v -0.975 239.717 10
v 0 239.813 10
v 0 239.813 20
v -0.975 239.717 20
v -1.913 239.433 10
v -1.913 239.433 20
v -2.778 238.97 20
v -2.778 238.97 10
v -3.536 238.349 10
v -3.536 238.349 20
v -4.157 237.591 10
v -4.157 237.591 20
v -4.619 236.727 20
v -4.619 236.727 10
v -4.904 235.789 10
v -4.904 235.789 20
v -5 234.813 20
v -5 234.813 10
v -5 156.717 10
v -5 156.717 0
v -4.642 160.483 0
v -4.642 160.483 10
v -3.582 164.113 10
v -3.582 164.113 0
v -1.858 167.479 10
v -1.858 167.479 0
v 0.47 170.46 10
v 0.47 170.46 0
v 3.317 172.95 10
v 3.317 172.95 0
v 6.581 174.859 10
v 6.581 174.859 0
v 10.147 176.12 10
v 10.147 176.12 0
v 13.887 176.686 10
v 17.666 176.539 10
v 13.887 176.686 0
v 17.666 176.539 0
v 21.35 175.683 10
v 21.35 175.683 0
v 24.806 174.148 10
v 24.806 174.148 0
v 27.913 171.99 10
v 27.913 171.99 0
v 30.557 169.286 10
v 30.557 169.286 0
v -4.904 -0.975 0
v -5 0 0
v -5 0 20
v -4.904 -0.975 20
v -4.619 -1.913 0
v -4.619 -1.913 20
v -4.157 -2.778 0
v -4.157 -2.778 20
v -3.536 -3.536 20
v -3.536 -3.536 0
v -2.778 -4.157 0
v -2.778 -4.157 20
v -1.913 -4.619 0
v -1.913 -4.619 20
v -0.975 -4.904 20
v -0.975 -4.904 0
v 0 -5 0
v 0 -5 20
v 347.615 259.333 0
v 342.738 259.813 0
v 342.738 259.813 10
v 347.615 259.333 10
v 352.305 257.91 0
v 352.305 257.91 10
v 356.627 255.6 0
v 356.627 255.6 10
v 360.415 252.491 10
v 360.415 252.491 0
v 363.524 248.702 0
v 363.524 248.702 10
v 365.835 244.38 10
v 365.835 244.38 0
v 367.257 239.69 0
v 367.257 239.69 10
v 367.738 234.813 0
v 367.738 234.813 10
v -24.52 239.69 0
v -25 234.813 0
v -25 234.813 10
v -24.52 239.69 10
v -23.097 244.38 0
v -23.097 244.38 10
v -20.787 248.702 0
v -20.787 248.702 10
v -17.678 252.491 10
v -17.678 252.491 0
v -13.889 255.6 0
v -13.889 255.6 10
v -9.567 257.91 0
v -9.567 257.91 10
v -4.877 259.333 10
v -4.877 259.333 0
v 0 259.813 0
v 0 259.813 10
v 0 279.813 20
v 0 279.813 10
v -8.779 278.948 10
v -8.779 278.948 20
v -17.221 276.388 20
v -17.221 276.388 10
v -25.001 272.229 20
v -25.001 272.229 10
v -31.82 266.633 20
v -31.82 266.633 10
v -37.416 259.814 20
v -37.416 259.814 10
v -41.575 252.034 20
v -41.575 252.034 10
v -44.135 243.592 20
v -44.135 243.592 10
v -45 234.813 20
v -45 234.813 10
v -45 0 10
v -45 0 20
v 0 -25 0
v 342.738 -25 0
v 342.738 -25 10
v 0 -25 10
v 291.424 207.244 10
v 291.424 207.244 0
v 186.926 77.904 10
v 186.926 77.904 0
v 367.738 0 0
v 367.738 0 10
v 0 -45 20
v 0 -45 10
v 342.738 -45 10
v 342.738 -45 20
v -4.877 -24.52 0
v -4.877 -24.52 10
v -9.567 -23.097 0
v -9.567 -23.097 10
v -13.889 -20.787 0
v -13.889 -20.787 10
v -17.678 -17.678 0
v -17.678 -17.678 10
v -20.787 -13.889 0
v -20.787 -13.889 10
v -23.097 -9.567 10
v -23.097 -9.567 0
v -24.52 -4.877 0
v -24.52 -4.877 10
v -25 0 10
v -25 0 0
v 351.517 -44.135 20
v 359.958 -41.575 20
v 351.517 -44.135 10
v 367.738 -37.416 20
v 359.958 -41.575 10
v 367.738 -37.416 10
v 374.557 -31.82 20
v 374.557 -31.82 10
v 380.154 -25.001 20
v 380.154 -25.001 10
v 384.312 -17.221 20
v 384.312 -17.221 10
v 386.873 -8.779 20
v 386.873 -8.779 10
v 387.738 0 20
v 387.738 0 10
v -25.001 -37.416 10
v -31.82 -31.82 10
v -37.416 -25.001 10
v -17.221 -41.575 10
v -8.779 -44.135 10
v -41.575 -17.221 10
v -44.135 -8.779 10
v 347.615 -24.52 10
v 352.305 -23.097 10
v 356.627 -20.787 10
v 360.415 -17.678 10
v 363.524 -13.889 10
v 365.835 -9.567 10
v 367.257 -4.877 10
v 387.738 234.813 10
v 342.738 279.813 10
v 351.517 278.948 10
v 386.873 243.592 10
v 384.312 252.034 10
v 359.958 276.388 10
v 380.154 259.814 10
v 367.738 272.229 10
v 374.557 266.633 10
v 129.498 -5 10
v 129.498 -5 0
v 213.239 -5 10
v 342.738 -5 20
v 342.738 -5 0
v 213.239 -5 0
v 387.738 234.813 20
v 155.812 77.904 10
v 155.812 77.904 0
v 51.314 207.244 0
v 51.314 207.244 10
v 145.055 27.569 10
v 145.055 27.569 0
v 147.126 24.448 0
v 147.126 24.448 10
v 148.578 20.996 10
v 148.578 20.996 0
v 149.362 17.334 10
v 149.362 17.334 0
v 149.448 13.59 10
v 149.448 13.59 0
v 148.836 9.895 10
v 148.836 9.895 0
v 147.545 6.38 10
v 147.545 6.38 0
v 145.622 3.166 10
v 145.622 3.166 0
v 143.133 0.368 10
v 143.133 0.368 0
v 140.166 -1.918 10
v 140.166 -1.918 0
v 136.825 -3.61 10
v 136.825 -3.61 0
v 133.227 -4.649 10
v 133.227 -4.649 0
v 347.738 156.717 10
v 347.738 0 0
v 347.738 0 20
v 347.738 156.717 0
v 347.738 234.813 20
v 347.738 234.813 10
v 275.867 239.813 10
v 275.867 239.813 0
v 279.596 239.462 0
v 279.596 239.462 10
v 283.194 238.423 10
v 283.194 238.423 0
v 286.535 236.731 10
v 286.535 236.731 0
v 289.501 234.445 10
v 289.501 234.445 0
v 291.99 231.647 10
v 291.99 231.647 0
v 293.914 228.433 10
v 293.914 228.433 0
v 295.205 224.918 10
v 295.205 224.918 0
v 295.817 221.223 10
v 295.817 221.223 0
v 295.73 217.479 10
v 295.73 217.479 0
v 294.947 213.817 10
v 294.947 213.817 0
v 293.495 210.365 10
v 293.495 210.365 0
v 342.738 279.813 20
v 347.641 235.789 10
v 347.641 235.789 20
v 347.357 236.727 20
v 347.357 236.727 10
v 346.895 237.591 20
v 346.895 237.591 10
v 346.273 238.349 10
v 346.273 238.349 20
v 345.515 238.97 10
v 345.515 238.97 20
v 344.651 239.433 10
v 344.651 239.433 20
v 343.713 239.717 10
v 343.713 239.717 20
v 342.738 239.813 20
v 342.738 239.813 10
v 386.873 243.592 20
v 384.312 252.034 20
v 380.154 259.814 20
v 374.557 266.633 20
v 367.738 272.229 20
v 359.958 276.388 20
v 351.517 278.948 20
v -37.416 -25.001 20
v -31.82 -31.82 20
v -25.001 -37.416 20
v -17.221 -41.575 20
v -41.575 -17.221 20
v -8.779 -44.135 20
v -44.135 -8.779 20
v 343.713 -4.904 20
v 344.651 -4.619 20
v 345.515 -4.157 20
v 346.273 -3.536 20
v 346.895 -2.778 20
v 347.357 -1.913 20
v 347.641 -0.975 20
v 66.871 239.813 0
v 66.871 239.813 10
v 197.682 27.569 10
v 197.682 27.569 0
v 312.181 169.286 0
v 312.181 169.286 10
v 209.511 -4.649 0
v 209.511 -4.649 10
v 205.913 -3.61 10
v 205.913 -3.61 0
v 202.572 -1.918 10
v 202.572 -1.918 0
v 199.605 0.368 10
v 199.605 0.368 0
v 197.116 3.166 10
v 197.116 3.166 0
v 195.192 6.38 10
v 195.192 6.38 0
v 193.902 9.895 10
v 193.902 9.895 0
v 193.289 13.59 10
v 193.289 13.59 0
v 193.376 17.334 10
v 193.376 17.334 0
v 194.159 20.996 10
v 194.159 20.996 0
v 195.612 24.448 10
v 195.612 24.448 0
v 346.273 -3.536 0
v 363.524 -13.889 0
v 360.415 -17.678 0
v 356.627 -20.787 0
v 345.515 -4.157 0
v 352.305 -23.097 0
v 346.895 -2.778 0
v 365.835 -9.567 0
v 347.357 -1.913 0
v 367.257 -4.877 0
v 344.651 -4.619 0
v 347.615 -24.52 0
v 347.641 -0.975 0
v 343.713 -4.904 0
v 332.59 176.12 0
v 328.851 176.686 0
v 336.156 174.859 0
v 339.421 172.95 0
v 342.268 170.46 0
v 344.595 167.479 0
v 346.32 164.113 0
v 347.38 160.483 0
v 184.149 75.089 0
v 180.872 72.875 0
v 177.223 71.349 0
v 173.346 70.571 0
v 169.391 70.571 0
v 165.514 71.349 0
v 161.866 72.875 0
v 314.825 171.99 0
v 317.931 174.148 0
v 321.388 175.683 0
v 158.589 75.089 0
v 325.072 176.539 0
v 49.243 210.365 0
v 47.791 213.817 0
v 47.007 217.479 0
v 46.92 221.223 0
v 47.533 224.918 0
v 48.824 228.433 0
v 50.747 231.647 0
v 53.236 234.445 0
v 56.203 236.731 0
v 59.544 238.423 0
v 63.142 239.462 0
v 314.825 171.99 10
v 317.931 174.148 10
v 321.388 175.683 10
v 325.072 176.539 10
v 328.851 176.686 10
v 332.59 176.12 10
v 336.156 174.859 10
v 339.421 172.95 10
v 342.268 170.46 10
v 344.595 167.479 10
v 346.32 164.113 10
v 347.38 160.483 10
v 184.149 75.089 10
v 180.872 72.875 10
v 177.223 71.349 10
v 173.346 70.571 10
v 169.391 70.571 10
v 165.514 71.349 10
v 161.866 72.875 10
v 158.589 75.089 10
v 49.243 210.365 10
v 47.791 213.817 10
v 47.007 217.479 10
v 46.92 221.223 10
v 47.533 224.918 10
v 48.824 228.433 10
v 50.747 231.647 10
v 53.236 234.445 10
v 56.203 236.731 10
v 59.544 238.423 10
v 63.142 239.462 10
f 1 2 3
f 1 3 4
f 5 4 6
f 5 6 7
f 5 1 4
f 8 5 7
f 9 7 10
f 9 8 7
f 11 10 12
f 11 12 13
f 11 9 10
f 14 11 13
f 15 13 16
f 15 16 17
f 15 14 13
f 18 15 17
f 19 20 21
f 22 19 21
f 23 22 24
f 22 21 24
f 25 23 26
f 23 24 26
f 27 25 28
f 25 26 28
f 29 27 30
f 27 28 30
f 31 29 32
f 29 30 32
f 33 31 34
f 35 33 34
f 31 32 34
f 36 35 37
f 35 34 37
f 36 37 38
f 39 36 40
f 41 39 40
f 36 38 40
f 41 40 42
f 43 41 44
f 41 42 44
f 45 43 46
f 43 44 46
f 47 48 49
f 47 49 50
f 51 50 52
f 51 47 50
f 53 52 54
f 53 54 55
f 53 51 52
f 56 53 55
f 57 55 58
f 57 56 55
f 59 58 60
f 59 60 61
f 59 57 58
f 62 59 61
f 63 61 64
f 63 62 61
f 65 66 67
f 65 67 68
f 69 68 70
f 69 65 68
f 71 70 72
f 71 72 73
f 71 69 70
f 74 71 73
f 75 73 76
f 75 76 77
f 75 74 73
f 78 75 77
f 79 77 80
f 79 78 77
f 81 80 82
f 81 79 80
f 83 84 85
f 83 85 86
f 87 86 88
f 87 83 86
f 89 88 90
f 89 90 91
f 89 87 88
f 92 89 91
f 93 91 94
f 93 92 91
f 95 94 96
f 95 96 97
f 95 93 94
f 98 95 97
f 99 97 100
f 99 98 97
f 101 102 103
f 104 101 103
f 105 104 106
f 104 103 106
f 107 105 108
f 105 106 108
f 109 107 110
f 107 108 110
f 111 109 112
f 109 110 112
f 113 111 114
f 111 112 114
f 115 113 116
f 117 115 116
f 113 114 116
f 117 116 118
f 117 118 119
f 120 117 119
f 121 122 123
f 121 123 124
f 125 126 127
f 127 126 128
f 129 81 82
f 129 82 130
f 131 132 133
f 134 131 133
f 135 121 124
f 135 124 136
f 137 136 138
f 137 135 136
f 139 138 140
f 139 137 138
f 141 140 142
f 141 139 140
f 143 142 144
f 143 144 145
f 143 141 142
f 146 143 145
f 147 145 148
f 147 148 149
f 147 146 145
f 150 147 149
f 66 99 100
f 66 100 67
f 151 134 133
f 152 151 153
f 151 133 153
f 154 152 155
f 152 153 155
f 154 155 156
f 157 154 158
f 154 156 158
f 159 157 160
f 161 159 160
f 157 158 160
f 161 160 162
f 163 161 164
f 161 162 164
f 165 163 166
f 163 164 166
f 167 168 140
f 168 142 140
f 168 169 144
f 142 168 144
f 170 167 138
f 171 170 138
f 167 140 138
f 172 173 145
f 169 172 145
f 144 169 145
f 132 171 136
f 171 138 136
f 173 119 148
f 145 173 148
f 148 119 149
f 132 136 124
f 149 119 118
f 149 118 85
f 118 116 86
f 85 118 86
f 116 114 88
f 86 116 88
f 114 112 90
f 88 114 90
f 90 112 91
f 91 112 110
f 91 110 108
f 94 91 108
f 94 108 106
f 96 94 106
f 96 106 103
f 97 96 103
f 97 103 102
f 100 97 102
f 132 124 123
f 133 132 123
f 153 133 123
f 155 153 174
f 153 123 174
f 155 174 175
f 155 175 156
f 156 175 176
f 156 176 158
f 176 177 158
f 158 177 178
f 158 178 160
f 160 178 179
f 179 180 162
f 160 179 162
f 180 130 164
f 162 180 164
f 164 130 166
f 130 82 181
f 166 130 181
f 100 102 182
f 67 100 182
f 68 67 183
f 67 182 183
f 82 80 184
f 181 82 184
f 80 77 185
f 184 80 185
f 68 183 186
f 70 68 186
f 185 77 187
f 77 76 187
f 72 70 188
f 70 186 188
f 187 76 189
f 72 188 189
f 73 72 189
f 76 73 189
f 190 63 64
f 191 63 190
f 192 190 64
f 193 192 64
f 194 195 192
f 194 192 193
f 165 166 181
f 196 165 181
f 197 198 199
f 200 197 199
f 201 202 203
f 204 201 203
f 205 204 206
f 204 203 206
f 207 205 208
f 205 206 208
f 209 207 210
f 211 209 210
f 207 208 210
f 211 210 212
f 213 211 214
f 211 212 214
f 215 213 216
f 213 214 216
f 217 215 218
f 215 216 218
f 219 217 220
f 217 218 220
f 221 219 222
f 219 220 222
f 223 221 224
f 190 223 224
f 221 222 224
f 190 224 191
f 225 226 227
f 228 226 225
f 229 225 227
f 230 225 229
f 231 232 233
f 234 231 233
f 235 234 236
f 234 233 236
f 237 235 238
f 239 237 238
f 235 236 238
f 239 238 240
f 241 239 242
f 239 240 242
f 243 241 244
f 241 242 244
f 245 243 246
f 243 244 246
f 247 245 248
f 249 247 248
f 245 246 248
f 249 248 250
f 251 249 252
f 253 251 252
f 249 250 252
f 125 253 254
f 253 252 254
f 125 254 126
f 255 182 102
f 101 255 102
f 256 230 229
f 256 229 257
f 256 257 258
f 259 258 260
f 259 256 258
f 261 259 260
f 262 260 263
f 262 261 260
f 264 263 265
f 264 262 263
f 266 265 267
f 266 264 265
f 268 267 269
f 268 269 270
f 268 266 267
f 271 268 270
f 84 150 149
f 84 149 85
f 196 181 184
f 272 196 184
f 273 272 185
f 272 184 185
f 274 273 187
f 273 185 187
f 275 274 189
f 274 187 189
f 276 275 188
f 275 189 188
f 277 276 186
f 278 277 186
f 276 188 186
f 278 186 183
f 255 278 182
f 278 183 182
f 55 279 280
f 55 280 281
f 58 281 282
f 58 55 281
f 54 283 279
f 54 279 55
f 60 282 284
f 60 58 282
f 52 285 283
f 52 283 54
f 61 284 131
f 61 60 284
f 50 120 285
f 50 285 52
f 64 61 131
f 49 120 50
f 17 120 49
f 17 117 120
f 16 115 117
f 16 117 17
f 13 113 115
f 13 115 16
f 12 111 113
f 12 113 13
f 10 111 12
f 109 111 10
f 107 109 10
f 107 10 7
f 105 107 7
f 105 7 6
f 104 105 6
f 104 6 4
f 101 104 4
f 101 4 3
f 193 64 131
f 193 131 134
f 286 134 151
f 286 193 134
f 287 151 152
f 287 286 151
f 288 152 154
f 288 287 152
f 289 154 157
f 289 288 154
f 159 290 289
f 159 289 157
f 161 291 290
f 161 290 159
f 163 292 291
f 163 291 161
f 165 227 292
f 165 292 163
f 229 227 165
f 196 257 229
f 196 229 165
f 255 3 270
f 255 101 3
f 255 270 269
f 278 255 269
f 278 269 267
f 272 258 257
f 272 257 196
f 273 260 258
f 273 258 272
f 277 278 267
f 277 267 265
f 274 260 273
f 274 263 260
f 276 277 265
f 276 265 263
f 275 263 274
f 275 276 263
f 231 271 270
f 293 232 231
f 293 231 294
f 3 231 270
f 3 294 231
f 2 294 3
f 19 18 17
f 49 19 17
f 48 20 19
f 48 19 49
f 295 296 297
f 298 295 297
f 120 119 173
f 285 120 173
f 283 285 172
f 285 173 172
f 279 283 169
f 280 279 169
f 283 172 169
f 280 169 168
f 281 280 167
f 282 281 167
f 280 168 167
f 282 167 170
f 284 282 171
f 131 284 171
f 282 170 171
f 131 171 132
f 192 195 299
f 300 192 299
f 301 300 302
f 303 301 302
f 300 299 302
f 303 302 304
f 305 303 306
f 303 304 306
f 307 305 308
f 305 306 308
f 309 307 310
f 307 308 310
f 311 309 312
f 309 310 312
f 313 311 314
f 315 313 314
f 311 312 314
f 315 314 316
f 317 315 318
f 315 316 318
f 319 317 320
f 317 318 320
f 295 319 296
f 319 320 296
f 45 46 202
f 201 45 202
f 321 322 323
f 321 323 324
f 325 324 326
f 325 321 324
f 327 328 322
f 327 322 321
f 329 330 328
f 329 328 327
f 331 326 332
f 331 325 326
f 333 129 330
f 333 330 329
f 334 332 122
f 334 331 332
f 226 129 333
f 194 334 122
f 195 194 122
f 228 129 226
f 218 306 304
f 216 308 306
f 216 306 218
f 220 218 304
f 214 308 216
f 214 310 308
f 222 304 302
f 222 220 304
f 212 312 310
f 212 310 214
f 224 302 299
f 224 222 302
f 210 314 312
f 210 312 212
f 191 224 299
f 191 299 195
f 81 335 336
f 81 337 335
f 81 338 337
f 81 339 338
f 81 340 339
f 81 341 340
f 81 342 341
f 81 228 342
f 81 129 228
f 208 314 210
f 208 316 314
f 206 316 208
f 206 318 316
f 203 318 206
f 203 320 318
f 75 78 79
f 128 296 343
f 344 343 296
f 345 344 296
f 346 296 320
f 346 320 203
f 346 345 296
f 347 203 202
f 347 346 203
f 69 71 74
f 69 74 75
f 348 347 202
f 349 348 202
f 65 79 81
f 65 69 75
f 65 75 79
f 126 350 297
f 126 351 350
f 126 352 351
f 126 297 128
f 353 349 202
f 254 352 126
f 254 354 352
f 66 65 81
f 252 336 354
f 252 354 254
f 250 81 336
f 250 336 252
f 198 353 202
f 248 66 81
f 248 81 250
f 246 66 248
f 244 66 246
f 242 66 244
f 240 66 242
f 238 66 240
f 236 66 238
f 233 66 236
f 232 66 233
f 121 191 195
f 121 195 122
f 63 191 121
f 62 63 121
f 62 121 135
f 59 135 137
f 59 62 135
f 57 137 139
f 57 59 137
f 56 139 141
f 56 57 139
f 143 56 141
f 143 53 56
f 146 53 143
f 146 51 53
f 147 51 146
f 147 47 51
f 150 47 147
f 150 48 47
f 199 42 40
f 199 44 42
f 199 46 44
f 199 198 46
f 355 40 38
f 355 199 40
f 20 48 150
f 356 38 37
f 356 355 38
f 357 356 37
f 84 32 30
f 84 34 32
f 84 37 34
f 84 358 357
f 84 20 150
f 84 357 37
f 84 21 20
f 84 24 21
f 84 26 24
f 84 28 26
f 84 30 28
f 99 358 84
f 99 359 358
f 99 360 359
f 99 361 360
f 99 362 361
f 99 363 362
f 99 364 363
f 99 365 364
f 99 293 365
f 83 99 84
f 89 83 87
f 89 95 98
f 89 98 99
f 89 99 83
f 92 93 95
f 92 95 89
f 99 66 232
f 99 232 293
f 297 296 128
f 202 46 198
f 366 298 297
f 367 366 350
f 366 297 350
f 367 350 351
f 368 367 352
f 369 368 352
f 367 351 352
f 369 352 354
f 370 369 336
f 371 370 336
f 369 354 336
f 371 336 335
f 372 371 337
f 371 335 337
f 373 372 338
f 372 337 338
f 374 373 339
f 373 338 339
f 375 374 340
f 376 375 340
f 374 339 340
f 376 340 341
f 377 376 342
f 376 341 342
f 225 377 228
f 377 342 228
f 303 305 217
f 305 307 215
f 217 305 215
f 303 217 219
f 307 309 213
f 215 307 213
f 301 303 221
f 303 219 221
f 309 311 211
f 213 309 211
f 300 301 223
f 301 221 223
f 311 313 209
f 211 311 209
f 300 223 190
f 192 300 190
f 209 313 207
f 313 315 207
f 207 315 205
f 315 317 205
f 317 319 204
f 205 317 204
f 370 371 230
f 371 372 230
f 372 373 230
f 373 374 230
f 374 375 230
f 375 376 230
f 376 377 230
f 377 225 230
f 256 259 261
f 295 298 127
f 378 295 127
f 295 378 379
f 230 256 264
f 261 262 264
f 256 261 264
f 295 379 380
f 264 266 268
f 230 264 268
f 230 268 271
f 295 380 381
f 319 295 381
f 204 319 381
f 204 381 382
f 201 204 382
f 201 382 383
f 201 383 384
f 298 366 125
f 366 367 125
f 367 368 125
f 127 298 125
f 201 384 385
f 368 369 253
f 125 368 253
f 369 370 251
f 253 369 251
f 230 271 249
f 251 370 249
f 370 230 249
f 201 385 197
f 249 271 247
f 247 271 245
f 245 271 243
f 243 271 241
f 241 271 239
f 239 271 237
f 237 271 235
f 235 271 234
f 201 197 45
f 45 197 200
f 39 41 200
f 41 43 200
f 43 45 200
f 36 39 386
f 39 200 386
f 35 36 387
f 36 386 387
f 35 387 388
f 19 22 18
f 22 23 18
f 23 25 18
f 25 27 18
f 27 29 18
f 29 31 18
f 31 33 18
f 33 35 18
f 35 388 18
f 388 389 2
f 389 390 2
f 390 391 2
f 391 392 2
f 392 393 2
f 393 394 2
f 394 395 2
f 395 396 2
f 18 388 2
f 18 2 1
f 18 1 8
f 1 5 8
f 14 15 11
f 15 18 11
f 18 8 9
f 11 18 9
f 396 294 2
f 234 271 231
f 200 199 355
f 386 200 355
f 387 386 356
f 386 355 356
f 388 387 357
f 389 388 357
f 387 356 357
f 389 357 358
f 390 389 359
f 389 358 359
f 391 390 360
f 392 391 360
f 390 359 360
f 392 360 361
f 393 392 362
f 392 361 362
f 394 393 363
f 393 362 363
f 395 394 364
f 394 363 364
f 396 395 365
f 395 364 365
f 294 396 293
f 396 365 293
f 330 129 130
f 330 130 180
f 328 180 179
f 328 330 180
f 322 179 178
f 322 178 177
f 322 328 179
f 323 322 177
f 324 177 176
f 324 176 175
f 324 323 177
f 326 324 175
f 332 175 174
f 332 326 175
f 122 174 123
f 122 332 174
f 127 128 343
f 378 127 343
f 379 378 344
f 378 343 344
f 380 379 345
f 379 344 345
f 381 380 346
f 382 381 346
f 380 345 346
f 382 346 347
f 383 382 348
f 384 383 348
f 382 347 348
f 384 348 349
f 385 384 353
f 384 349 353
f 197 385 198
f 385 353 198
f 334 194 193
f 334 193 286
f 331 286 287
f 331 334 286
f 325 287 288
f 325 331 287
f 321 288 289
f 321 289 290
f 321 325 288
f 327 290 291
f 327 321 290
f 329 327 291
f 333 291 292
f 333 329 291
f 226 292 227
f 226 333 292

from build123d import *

# Parameters (mm, degrees)
BOSS_EXTRUDE1_DEPTH = 10
BOSS_EXTRUDE2_DEPTH = 10


with BuildPart() as part:
    # Sketch1 → Boss-Extrude1 (new body)
    with BuildSketch(Plane.XY):
        with BuildLine():
            Line((-25, 0), (-25, 234.81313371))
            ThreePointArc((-25, 234.81313371), (-17.67766953, 252.49080324), (0, 259.81313371))
            Line((0, 259.81313371), (342.73755676, 259.81313371))
            ThreePointArc((342.73755676, 259.81313371), (360.415226289, 252.49080324), (367.73755676, 234.81313371))
            Line((367.73755676, 234.81313371), (367.73755676, 0))
            ThreePointArc((367.73755676, 0), (360.415226289, -17.67766953), (342.73755676, -25))
            Line((342.73755676, -25), (0, -25))
            ThreePointArc((0, -25), (-17.67766953, -17.67766953), (-25, 0))
        make_face()
        with BuildLine():
            Line((-5, 0), (-5, 156.717467164))
            ThreePointArc((-5, 156.717467164), (8.334411906, 175.574029293), (30.556993535, 169.286474767))
            Line((30.556993535, 169.286474767), (145.055204149, 27.569007604))
            ThreePointArc((145.055204149, 27.569007604), (147.545096107, 6.37967959), (129.498210613, -5))
            Line((129.498210613, -5), (0, -5))
            ThreePointArc((0, -5), (-3.535533906, -3.535533906), (-5, 0))
        make_face(mode=Mode.SUBTRACT)
        with BuildLine():
            Line((66.870567767, 239.81313371), (275.866988993, 239.81313371))
            ThreePointArc((275.866988993, 239.81313371), (293.913874487, 228.43345412), (291.423982529, 207.244126107))
            Line((291.423982529, 207.244126107), (186.925771915, 77.903923741))
            ThreePointArc((186.925771915, 77.903923741), (171.36877838, 70.472931344), (155.811784844, 77.903923741))
            Line((155.811784844, 77.903923741), (51.313574231, 207.244126107))
            ThreePointArc((51.313574231, 207.244126107), (48.823682273, 228.43345412), (66.870567767, 239.81313371))
        make_face(mode=Mode.SUBTRACT)
        with BuildLine():
            Line((347.73755676, 156.717467164), (347.73755676, 0))
            ThreePointArc((347.73755676, 0), (346.273090666, -3.535533906), (342.73755676, -5))
            Line((342.73755676, -5), (213.239346146, -5))
            ThreePointArc((213.239346146, -5), (195.192460652, 6.37967959), (197.682352611, 27.569007604))
            Line((197.682352611, 27.569007604), (312.180563224, 169.286474767))
            ThreePointArc((312.180563224, 169.286474767), (334.403144854, 175.574029293), (347.73755676, 156.717467164))
        make_face(mode=Mode.SUBTRACT)
    extrude(amount=BOSS_EXTRUDE1_DEPTH)

    # Sketch2 → Boss-Extrude2 (add)
    with BuildSketch(Plane.XY.offset(10)):
        with BuildLine():
            Line((342.73755676, 279.81313371), (0, 279.81313371))
            ThreePointArc((0, 279.81313371), (-31.819805153, 266.632938864), (-45, 234.81313371))
            Line((-45, 234.81313371), (-45, 0))
            ThreePointArc((-45, 0), (-31.819805153, -31.819805153), (0, -45))
            Line((0, -45), (342.73755676, -45))
            ThreePointArc((342.73755676, -45), (374.557361913, -31.819805153), (387.73755676, 0))
            Line((387.73755676, 0), (387.73755676, 234.81313371))
            ThreePointArc((387.73755676, 234.81313371), (374.557361913, 266.632938864), (342.73755676, 279.81313371))
        make_face()
        with BuildLine():
            Line((342.73755676, 239.81313371), (0, 239.81313371))
            ThreePointArc((0, 239.81313371), (-3.535533906, 238.348667616), (-5, 234.81313371))
            Line((-5, 234.81313371), (-5, 0))
            ThreePointArc((-5, 0), (-3.535533906, -3.535533906), (0, -5))
            Line((0, -5), (342.73755676, -5))
            ThreePointArc((342.73755676, -5), (346.273090666, -3.535533906), (347.73755676, 0))
            Line((347.73755676, 0), (347.73755676, 234.81313371))
            ThreePointArc((347.73755676, 234.81313371), (346.273090666, 238.348667616), (342.73755676, 239.81313371))
        make_face(mode=Mode.SUBTRACT)
    extrude(amount=BOSS_EXTRUDE2_DEPTH)


solid = part.part
